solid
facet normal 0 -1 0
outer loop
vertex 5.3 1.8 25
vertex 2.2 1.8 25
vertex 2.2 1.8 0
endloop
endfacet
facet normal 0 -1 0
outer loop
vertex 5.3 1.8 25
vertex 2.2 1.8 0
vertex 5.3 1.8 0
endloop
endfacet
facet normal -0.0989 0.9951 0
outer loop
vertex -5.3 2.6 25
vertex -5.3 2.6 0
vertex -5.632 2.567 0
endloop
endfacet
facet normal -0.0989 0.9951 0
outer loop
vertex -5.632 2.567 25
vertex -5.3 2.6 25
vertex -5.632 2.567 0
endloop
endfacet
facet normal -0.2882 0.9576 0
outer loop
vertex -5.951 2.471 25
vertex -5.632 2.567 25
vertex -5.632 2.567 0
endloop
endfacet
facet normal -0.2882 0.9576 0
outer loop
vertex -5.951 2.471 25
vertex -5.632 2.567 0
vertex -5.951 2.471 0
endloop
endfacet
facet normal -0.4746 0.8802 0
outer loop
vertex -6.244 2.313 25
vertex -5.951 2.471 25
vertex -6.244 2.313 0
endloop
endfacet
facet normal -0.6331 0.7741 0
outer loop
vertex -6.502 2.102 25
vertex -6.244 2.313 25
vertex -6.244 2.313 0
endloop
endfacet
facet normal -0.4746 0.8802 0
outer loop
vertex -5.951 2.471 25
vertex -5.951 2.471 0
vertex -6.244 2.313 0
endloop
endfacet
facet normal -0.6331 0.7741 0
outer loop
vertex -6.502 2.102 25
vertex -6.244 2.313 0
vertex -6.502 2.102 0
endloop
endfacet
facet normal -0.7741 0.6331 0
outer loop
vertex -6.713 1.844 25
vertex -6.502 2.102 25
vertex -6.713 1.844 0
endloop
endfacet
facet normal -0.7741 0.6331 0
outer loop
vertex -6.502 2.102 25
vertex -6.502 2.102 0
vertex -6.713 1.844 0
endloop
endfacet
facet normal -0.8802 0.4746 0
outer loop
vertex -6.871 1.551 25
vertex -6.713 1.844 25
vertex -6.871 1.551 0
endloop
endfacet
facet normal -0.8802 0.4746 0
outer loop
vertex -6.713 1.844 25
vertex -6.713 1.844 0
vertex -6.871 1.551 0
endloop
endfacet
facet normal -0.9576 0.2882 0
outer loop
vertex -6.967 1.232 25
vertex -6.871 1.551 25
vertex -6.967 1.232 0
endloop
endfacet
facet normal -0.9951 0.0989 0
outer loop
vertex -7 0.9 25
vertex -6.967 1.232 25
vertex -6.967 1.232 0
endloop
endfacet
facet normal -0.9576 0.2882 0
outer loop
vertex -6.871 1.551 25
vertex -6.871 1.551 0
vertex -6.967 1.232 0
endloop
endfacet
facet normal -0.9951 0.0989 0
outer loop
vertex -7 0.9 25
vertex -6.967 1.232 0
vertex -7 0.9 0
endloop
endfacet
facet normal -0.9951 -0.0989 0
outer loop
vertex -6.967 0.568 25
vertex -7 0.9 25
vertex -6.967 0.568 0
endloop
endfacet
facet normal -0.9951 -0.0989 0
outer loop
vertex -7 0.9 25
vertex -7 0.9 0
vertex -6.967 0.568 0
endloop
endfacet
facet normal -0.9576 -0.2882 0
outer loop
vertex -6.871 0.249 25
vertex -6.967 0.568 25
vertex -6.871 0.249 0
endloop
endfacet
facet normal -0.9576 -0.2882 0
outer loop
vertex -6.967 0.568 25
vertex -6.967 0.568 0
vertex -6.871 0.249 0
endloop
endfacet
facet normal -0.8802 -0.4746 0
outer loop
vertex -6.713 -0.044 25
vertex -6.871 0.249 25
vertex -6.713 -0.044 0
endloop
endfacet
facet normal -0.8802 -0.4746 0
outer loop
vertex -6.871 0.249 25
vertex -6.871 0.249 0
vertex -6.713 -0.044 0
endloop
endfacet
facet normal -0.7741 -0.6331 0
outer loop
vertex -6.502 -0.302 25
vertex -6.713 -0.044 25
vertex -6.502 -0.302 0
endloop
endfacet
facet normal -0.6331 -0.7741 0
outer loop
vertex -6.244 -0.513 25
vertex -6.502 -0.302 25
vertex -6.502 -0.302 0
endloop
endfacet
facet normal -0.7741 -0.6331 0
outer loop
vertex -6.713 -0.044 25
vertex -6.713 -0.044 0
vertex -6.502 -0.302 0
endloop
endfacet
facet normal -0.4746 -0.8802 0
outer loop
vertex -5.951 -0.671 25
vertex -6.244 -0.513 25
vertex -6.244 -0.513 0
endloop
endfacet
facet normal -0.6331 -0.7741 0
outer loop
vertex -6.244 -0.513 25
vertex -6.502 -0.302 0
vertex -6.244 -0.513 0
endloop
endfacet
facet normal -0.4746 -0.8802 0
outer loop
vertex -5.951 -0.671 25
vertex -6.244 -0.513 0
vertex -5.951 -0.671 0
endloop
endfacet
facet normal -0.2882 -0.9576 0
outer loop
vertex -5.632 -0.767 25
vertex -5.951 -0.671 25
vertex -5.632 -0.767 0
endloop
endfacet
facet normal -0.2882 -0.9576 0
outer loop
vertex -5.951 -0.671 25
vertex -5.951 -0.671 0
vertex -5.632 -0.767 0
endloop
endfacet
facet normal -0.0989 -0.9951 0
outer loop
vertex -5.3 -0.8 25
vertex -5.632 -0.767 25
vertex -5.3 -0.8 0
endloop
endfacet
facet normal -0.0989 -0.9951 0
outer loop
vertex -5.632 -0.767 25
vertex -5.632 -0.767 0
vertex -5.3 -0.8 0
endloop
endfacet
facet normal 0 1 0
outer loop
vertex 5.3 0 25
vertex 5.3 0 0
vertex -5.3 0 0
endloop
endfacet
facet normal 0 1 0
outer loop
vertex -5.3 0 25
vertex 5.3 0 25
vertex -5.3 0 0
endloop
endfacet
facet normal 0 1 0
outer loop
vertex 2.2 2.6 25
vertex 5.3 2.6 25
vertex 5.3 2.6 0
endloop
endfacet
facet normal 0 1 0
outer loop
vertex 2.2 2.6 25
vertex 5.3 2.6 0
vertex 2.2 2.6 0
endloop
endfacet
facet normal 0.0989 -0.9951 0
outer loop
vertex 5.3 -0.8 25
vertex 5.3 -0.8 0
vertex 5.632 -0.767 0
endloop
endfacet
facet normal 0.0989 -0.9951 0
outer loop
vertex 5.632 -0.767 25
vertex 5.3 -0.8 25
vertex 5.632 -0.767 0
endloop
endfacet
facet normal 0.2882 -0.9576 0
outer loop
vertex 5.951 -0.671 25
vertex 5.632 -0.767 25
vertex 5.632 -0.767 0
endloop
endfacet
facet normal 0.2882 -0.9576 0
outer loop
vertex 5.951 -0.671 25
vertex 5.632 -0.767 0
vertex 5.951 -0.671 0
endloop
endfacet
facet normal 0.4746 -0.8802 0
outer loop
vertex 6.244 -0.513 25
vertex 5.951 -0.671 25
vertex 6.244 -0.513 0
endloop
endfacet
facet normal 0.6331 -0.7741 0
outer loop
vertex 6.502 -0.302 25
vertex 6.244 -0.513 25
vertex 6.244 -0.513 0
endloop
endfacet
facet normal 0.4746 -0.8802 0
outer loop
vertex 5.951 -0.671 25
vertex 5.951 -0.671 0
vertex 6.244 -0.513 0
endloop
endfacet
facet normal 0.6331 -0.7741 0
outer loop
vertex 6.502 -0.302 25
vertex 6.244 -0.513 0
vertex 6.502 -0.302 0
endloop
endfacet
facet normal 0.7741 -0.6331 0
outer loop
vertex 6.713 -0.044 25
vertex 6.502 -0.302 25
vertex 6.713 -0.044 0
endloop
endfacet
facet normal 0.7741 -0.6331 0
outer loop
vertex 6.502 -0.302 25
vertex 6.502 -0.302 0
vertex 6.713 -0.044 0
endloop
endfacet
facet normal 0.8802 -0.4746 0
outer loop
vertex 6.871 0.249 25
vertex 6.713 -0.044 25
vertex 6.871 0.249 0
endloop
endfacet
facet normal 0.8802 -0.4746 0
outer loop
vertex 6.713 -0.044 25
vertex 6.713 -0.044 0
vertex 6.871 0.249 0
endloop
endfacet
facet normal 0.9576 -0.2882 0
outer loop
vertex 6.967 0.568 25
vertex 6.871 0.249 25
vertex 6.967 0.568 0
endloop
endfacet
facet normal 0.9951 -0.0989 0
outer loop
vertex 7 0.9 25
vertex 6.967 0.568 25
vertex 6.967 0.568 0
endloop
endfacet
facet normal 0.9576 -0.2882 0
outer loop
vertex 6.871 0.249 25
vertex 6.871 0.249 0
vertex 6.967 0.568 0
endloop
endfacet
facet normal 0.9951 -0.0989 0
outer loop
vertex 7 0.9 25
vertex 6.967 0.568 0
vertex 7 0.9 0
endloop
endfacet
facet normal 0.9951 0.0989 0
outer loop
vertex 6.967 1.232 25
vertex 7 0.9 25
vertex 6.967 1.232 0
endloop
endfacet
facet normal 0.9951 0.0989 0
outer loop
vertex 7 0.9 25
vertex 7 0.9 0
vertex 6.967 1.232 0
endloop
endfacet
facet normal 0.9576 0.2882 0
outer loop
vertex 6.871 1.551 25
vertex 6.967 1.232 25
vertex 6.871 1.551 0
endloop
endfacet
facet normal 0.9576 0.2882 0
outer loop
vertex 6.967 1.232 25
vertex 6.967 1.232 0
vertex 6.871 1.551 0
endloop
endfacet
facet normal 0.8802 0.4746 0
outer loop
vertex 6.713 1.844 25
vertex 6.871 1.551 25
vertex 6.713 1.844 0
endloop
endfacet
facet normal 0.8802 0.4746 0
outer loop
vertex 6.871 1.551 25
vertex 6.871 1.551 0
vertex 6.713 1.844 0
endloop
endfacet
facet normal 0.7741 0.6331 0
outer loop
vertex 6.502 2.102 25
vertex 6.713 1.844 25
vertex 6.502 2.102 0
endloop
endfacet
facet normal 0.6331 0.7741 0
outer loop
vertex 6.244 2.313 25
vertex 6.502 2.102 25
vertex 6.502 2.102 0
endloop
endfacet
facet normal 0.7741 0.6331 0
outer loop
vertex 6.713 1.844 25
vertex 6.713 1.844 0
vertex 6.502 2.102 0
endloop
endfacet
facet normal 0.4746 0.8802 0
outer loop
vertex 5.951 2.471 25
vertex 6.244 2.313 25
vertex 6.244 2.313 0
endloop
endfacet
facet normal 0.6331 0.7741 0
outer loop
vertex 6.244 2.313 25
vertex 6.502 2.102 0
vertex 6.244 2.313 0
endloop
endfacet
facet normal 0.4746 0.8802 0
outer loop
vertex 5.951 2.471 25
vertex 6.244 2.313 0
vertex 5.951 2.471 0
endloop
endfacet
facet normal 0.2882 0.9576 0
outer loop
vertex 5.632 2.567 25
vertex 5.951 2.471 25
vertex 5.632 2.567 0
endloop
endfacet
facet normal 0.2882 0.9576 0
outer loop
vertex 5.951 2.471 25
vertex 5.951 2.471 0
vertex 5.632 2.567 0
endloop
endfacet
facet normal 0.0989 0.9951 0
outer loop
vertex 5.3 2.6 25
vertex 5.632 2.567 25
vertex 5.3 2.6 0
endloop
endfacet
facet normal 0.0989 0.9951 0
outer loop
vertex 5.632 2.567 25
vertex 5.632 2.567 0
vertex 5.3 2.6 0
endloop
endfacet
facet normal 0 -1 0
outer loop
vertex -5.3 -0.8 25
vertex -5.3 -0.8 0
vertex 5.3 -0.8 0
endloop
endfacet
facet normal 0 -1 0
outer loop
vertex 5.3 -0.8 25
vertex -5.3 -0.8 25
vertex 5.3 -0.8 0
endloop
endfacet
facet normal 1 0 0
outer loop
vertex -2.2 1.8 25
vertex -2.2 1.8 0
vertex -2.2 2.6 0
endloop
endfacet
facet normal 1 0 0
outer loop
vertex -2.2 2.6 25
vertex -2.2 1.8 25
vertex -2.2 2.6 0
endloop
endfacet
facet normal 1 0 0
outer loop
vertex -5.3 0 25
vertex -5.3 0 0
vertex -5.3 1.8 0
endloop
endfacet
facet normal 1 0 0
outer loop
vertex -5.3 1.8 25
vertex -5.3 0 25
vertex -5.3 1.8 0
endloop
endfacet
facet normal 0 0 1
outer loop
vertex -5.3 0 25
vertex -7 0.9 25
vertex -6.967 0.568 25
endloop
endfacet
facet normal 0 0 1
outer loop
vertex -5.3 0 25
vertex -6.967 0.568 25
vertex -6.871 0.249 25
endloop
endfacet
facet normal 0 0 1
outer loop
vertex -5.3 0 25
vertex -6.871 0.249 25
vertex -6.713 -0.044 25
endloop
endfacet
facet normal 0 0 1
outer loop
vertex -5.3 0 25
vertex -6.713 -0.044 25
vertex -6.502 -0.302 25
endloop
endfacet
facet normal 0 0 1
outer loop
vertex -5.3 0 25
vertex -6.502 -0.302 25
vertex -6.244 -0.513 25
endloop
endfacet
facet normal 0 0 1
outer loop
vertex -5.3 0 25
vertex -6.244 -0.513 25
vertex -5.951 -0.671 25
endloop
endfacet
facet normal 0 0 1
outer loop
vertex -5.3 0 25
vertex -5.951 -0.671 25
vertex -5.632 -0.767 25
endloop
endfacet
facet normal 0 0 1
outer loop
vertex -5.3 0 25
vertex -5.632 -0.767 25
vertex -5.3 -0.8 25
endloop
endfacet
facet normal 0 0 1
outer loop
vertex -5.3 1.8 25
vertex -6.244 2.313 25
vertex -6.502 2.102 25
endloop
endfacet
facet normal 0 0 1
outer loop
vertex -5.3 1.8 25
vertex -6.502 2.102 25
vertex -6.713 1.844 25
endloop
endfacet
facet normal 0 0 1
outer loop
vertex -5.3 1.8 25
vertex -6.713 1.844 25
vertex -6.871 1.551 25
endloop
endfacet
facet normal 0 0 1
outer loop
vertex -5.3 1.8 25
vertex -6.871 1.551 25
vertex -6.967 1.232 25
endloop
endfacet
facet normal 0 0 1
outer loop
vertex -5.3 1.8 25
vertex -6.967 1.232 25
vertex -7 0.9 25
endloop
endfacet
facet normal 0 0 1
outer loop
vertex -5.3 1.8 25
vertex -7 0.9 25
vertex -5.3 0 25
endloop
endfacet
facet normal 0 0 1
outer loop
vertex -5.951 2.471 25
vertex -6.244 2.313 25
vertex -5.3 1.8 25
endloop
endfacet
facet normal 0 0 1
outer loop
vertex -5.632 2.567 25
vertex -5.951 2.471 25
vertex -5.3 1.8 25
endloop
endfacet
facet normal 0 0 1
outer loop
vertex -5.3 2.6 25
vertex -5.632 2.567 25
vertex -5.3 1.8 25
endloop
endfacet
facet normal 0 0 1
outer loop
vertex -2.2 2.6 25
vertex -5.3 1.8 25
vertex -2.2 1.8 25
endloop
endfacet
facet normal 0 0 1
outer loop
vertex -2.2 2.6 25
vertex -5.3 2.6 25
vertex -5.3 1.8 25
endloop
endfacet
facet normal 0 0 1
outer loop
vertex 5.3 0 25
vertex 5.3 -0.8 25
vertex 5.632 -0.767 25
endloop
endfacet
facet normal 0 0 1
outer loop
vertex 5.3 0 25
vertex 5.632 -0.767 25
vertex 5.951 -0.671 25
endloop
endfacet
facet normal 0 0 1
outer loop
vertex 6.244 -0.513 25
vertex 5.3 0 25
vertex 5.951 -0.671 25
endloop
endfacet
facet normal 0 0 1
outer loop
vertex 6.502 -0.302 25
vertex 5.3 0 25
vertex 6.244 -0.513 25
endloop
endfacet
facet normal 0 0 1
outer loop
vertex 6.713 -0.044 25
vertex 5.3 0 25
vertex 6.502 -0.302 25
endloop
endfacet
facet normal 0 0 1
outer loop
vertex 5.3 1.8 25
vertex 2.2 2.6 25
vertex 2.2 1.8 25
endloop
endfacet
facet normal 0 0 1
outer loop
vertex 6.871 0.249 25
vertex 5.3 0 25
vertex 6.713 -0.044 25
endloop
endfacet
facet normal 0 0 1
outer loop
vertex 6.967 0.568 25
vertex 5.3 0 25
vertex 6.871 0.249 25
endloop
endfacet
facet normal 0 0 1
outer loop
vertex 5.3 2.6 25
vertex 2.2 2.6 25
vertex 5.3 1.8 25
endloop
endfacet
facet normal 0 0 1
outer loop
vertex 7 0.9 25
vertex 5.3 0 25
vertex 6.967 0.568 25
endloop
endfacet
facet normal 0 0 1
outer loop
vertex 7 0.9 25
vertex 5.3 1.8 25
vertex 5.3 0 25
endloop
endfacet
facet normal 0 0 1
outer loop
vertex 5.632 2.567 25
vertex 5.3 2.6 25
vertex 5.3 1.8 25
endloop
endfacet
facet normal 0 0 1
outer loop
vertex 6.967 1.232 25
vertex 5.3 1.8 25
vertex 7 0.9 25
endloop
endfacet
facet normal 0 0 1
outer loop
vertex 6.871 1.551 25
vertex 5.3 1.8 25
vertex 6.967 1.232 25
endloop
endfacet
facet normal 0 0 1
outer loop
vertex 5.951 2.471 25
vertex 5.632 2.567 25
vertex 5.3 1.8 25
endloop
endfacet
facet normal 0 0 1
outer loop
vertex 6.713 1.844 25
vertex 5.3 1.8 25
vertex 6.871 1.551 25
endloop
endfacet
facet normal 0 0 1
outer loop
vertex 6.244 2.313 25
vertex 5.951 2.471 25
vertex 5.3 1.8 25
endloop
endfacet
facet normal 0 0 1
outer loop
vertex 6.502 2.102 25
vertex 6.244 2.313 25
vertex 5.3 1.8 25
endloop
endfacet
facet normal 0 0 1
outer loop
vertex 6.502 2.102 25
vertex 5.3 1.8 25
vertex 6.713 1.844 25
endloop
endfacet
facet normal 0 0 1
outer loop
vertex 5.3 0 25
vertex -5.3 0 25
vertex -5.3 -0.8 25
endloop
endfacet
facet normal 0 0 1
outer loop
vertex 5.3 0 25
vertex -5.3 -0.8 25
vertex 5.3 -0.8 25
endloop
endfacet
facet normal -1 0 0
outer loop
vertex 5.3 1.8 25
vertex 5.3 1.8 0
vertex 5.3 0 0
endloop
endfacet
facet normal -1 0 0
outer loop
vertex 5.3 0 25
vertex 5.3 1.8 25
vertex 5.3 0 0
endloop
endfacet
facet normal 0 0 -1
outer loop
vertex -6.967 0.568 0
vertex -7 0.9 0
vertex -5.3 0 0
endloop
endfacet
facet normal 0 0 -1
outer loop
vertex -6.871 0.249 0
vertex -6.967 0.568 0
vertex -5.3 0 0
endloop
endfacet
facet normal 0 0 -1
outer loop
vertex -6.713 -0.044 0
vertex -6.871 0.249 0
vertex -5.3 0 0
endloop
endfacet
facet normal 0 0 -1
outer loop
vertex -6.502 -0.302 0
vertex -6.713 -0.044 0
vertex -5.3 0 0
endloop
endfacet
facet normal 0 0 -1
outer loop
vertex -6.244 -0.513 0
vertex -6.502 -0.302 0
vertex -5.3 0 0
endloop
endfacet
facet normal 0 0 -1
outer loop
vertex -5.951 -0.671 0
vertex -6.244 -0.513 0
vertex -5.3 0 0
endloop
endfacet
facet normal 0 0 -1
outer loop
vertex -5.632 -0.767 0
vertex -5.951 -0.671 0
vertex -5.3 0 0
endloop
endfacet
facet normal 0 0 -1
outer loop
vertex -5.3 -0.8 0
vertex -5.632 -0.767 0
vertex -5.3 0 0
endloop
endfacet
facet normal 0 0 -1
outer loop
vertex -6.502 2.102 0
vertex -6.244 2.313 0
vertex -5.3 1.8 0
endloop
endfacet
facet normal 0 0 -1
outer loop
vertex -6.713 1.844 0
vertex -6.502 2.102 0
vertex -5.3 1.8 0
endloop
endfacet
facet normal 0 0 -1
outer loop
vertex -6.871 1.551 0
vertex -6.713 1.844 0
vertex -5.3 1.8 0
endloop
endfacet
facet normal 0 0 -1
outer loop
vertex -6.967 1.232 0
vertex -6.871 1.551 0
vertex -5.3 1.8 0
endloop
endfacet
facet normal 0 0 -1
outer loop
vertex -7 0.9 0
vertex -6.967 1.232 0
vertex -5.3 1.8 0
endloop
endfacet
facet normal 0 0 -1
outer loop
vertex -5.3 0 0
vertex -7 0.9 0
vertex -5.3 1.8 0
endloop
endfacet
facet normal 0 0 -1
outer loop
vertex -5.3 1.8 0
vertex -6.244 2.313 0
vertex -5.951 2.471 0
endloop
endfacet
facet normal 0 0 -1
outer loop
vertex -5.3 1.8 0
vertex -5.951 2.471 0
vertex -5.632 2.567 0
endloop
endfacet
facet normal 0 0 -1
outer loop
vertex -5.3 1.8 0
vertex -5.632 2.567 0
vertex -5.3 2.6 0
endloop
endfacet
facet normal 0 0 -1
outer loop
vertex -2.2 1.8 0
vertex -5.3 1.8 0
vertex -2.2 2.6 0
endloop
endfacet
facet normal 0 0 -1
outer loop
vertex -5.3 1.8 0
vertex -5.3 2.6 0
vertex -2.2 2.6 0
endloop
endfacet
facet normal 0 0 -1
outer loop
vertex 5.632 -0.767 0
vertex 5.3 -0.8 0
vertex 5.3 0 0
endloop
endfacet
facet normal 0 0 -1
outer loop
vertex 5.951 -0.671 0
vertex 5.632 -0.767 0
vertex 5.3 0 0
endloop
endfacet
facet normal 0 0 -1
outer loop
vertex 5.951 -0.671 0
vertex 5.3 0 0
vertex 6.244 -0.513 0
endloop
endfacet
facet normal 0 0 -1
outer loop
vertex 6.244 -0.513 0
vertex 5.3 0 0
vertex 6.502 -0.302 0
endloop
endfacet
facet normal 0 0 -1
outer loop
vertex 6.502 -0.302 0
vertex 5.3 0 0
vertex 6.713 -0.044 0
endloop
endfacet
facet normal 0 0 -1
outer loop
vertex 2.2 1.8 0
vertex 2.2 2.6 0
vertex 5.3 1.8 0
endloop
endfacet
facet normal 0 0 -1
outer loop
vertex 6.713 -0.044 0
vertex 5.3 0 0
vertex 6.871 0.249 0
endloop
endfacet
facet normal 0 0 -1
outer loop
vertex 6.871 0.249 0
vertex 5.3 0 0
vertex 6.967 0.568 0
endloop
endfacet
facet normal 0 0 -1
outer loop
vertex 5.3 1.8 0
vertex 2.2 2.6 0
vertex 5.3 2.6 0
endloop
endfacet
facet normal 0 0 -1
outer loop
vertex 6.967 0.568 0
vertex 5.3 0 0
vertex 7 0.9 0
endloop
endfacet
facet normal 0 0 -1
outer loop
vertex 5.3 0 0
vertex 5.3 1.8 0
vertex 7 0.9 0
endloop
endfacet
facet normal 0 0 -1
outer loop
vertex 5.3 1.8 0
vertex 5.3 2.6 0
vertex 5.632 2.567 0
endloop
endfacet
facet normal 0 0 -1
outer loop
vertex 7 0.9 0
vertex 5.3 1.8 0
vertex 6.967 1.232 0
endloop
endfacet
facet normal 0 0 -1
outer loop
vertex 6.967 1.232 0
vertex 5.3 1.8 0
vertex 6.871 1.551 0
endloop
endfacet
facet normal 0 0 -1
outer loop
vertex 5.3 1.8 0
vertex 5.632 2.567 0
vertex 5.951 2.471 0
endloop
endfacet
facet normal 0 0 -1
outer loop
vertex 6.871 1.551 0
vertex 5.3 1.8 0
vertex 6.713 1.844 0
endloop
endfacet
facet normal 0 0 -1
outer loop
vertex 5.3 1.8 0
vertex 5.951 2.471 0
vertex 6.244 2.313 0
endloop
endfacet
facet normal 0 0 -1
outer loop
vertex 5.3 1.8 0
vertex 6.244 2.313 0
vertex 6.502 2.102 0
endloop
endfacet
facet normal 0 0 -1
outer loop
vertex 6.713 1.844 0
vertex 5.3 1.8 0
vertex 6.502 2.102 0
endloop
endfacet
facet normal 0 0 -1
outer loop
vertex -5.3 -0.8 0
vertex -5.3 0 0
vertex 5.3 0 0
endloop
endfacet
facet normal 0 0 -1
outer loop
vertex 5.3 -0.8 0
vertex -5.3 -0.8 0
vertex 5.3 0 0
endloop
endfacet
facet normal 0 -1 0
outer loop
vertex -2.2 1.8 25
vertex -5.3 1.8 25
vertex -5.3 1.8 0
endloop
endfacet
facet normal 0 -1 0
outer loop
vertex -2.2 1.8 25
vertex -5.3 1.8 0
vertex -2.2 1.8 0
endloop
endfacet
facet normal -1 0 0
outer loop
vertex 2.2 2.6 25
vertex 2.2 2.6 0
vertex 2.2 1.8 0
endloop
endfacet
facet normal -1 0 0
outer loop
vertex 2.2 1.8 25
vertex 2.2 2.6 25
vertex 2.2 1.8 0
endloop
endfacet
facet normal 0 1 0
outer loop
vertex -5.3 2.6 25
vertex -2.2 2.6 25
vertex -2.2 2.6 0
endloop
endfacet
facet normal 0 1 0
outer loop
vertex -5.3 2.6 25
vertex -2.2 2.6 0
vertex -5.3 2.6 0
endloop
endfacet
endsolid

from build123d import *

# Parameters (mm, degrees)
F1_DEPTH = 25


with BuildPart() as f1:
    # F0 (on Top) → F1 (new body)
    with BuildSketch(Plane.XY):
        with BuildLine():
            Line((5.3, 0), (0, 0))
            Line((0, 0), (-5.3, 0))
            Line((-5.3, 0), (-5.3, 1.8))
            Line((-5.3, 1.8), (-2.2, 1.8))
            Line((-2.2, 1.8), (-2.2, 2.6))
            Line((-2.2, 2.6), (-5.3, 2.6))
            ThreePointArc((-5.3, 2.6), (-7, 0.9), (-5.3, -0.8))
            Line((-5.3, -0.8), (0, -0.8))
            Line((0, -0.8), (5.3, -0.8))
            ThreePointArc((5.3, -0.8), (7, 0.9), (5.3, 2.6))
            Line((5.3, 2.6), (2.2, 2.6))
            Line((2.2, 2.6), (2.2, 1.8))
            Line((2.2, 1.8), (5.3, 1.8))
            Line((5.3, 1.8), (5.3, 0))
        make_face()
    extrude(amount=F1_DEPTH)


solid = f1.part
